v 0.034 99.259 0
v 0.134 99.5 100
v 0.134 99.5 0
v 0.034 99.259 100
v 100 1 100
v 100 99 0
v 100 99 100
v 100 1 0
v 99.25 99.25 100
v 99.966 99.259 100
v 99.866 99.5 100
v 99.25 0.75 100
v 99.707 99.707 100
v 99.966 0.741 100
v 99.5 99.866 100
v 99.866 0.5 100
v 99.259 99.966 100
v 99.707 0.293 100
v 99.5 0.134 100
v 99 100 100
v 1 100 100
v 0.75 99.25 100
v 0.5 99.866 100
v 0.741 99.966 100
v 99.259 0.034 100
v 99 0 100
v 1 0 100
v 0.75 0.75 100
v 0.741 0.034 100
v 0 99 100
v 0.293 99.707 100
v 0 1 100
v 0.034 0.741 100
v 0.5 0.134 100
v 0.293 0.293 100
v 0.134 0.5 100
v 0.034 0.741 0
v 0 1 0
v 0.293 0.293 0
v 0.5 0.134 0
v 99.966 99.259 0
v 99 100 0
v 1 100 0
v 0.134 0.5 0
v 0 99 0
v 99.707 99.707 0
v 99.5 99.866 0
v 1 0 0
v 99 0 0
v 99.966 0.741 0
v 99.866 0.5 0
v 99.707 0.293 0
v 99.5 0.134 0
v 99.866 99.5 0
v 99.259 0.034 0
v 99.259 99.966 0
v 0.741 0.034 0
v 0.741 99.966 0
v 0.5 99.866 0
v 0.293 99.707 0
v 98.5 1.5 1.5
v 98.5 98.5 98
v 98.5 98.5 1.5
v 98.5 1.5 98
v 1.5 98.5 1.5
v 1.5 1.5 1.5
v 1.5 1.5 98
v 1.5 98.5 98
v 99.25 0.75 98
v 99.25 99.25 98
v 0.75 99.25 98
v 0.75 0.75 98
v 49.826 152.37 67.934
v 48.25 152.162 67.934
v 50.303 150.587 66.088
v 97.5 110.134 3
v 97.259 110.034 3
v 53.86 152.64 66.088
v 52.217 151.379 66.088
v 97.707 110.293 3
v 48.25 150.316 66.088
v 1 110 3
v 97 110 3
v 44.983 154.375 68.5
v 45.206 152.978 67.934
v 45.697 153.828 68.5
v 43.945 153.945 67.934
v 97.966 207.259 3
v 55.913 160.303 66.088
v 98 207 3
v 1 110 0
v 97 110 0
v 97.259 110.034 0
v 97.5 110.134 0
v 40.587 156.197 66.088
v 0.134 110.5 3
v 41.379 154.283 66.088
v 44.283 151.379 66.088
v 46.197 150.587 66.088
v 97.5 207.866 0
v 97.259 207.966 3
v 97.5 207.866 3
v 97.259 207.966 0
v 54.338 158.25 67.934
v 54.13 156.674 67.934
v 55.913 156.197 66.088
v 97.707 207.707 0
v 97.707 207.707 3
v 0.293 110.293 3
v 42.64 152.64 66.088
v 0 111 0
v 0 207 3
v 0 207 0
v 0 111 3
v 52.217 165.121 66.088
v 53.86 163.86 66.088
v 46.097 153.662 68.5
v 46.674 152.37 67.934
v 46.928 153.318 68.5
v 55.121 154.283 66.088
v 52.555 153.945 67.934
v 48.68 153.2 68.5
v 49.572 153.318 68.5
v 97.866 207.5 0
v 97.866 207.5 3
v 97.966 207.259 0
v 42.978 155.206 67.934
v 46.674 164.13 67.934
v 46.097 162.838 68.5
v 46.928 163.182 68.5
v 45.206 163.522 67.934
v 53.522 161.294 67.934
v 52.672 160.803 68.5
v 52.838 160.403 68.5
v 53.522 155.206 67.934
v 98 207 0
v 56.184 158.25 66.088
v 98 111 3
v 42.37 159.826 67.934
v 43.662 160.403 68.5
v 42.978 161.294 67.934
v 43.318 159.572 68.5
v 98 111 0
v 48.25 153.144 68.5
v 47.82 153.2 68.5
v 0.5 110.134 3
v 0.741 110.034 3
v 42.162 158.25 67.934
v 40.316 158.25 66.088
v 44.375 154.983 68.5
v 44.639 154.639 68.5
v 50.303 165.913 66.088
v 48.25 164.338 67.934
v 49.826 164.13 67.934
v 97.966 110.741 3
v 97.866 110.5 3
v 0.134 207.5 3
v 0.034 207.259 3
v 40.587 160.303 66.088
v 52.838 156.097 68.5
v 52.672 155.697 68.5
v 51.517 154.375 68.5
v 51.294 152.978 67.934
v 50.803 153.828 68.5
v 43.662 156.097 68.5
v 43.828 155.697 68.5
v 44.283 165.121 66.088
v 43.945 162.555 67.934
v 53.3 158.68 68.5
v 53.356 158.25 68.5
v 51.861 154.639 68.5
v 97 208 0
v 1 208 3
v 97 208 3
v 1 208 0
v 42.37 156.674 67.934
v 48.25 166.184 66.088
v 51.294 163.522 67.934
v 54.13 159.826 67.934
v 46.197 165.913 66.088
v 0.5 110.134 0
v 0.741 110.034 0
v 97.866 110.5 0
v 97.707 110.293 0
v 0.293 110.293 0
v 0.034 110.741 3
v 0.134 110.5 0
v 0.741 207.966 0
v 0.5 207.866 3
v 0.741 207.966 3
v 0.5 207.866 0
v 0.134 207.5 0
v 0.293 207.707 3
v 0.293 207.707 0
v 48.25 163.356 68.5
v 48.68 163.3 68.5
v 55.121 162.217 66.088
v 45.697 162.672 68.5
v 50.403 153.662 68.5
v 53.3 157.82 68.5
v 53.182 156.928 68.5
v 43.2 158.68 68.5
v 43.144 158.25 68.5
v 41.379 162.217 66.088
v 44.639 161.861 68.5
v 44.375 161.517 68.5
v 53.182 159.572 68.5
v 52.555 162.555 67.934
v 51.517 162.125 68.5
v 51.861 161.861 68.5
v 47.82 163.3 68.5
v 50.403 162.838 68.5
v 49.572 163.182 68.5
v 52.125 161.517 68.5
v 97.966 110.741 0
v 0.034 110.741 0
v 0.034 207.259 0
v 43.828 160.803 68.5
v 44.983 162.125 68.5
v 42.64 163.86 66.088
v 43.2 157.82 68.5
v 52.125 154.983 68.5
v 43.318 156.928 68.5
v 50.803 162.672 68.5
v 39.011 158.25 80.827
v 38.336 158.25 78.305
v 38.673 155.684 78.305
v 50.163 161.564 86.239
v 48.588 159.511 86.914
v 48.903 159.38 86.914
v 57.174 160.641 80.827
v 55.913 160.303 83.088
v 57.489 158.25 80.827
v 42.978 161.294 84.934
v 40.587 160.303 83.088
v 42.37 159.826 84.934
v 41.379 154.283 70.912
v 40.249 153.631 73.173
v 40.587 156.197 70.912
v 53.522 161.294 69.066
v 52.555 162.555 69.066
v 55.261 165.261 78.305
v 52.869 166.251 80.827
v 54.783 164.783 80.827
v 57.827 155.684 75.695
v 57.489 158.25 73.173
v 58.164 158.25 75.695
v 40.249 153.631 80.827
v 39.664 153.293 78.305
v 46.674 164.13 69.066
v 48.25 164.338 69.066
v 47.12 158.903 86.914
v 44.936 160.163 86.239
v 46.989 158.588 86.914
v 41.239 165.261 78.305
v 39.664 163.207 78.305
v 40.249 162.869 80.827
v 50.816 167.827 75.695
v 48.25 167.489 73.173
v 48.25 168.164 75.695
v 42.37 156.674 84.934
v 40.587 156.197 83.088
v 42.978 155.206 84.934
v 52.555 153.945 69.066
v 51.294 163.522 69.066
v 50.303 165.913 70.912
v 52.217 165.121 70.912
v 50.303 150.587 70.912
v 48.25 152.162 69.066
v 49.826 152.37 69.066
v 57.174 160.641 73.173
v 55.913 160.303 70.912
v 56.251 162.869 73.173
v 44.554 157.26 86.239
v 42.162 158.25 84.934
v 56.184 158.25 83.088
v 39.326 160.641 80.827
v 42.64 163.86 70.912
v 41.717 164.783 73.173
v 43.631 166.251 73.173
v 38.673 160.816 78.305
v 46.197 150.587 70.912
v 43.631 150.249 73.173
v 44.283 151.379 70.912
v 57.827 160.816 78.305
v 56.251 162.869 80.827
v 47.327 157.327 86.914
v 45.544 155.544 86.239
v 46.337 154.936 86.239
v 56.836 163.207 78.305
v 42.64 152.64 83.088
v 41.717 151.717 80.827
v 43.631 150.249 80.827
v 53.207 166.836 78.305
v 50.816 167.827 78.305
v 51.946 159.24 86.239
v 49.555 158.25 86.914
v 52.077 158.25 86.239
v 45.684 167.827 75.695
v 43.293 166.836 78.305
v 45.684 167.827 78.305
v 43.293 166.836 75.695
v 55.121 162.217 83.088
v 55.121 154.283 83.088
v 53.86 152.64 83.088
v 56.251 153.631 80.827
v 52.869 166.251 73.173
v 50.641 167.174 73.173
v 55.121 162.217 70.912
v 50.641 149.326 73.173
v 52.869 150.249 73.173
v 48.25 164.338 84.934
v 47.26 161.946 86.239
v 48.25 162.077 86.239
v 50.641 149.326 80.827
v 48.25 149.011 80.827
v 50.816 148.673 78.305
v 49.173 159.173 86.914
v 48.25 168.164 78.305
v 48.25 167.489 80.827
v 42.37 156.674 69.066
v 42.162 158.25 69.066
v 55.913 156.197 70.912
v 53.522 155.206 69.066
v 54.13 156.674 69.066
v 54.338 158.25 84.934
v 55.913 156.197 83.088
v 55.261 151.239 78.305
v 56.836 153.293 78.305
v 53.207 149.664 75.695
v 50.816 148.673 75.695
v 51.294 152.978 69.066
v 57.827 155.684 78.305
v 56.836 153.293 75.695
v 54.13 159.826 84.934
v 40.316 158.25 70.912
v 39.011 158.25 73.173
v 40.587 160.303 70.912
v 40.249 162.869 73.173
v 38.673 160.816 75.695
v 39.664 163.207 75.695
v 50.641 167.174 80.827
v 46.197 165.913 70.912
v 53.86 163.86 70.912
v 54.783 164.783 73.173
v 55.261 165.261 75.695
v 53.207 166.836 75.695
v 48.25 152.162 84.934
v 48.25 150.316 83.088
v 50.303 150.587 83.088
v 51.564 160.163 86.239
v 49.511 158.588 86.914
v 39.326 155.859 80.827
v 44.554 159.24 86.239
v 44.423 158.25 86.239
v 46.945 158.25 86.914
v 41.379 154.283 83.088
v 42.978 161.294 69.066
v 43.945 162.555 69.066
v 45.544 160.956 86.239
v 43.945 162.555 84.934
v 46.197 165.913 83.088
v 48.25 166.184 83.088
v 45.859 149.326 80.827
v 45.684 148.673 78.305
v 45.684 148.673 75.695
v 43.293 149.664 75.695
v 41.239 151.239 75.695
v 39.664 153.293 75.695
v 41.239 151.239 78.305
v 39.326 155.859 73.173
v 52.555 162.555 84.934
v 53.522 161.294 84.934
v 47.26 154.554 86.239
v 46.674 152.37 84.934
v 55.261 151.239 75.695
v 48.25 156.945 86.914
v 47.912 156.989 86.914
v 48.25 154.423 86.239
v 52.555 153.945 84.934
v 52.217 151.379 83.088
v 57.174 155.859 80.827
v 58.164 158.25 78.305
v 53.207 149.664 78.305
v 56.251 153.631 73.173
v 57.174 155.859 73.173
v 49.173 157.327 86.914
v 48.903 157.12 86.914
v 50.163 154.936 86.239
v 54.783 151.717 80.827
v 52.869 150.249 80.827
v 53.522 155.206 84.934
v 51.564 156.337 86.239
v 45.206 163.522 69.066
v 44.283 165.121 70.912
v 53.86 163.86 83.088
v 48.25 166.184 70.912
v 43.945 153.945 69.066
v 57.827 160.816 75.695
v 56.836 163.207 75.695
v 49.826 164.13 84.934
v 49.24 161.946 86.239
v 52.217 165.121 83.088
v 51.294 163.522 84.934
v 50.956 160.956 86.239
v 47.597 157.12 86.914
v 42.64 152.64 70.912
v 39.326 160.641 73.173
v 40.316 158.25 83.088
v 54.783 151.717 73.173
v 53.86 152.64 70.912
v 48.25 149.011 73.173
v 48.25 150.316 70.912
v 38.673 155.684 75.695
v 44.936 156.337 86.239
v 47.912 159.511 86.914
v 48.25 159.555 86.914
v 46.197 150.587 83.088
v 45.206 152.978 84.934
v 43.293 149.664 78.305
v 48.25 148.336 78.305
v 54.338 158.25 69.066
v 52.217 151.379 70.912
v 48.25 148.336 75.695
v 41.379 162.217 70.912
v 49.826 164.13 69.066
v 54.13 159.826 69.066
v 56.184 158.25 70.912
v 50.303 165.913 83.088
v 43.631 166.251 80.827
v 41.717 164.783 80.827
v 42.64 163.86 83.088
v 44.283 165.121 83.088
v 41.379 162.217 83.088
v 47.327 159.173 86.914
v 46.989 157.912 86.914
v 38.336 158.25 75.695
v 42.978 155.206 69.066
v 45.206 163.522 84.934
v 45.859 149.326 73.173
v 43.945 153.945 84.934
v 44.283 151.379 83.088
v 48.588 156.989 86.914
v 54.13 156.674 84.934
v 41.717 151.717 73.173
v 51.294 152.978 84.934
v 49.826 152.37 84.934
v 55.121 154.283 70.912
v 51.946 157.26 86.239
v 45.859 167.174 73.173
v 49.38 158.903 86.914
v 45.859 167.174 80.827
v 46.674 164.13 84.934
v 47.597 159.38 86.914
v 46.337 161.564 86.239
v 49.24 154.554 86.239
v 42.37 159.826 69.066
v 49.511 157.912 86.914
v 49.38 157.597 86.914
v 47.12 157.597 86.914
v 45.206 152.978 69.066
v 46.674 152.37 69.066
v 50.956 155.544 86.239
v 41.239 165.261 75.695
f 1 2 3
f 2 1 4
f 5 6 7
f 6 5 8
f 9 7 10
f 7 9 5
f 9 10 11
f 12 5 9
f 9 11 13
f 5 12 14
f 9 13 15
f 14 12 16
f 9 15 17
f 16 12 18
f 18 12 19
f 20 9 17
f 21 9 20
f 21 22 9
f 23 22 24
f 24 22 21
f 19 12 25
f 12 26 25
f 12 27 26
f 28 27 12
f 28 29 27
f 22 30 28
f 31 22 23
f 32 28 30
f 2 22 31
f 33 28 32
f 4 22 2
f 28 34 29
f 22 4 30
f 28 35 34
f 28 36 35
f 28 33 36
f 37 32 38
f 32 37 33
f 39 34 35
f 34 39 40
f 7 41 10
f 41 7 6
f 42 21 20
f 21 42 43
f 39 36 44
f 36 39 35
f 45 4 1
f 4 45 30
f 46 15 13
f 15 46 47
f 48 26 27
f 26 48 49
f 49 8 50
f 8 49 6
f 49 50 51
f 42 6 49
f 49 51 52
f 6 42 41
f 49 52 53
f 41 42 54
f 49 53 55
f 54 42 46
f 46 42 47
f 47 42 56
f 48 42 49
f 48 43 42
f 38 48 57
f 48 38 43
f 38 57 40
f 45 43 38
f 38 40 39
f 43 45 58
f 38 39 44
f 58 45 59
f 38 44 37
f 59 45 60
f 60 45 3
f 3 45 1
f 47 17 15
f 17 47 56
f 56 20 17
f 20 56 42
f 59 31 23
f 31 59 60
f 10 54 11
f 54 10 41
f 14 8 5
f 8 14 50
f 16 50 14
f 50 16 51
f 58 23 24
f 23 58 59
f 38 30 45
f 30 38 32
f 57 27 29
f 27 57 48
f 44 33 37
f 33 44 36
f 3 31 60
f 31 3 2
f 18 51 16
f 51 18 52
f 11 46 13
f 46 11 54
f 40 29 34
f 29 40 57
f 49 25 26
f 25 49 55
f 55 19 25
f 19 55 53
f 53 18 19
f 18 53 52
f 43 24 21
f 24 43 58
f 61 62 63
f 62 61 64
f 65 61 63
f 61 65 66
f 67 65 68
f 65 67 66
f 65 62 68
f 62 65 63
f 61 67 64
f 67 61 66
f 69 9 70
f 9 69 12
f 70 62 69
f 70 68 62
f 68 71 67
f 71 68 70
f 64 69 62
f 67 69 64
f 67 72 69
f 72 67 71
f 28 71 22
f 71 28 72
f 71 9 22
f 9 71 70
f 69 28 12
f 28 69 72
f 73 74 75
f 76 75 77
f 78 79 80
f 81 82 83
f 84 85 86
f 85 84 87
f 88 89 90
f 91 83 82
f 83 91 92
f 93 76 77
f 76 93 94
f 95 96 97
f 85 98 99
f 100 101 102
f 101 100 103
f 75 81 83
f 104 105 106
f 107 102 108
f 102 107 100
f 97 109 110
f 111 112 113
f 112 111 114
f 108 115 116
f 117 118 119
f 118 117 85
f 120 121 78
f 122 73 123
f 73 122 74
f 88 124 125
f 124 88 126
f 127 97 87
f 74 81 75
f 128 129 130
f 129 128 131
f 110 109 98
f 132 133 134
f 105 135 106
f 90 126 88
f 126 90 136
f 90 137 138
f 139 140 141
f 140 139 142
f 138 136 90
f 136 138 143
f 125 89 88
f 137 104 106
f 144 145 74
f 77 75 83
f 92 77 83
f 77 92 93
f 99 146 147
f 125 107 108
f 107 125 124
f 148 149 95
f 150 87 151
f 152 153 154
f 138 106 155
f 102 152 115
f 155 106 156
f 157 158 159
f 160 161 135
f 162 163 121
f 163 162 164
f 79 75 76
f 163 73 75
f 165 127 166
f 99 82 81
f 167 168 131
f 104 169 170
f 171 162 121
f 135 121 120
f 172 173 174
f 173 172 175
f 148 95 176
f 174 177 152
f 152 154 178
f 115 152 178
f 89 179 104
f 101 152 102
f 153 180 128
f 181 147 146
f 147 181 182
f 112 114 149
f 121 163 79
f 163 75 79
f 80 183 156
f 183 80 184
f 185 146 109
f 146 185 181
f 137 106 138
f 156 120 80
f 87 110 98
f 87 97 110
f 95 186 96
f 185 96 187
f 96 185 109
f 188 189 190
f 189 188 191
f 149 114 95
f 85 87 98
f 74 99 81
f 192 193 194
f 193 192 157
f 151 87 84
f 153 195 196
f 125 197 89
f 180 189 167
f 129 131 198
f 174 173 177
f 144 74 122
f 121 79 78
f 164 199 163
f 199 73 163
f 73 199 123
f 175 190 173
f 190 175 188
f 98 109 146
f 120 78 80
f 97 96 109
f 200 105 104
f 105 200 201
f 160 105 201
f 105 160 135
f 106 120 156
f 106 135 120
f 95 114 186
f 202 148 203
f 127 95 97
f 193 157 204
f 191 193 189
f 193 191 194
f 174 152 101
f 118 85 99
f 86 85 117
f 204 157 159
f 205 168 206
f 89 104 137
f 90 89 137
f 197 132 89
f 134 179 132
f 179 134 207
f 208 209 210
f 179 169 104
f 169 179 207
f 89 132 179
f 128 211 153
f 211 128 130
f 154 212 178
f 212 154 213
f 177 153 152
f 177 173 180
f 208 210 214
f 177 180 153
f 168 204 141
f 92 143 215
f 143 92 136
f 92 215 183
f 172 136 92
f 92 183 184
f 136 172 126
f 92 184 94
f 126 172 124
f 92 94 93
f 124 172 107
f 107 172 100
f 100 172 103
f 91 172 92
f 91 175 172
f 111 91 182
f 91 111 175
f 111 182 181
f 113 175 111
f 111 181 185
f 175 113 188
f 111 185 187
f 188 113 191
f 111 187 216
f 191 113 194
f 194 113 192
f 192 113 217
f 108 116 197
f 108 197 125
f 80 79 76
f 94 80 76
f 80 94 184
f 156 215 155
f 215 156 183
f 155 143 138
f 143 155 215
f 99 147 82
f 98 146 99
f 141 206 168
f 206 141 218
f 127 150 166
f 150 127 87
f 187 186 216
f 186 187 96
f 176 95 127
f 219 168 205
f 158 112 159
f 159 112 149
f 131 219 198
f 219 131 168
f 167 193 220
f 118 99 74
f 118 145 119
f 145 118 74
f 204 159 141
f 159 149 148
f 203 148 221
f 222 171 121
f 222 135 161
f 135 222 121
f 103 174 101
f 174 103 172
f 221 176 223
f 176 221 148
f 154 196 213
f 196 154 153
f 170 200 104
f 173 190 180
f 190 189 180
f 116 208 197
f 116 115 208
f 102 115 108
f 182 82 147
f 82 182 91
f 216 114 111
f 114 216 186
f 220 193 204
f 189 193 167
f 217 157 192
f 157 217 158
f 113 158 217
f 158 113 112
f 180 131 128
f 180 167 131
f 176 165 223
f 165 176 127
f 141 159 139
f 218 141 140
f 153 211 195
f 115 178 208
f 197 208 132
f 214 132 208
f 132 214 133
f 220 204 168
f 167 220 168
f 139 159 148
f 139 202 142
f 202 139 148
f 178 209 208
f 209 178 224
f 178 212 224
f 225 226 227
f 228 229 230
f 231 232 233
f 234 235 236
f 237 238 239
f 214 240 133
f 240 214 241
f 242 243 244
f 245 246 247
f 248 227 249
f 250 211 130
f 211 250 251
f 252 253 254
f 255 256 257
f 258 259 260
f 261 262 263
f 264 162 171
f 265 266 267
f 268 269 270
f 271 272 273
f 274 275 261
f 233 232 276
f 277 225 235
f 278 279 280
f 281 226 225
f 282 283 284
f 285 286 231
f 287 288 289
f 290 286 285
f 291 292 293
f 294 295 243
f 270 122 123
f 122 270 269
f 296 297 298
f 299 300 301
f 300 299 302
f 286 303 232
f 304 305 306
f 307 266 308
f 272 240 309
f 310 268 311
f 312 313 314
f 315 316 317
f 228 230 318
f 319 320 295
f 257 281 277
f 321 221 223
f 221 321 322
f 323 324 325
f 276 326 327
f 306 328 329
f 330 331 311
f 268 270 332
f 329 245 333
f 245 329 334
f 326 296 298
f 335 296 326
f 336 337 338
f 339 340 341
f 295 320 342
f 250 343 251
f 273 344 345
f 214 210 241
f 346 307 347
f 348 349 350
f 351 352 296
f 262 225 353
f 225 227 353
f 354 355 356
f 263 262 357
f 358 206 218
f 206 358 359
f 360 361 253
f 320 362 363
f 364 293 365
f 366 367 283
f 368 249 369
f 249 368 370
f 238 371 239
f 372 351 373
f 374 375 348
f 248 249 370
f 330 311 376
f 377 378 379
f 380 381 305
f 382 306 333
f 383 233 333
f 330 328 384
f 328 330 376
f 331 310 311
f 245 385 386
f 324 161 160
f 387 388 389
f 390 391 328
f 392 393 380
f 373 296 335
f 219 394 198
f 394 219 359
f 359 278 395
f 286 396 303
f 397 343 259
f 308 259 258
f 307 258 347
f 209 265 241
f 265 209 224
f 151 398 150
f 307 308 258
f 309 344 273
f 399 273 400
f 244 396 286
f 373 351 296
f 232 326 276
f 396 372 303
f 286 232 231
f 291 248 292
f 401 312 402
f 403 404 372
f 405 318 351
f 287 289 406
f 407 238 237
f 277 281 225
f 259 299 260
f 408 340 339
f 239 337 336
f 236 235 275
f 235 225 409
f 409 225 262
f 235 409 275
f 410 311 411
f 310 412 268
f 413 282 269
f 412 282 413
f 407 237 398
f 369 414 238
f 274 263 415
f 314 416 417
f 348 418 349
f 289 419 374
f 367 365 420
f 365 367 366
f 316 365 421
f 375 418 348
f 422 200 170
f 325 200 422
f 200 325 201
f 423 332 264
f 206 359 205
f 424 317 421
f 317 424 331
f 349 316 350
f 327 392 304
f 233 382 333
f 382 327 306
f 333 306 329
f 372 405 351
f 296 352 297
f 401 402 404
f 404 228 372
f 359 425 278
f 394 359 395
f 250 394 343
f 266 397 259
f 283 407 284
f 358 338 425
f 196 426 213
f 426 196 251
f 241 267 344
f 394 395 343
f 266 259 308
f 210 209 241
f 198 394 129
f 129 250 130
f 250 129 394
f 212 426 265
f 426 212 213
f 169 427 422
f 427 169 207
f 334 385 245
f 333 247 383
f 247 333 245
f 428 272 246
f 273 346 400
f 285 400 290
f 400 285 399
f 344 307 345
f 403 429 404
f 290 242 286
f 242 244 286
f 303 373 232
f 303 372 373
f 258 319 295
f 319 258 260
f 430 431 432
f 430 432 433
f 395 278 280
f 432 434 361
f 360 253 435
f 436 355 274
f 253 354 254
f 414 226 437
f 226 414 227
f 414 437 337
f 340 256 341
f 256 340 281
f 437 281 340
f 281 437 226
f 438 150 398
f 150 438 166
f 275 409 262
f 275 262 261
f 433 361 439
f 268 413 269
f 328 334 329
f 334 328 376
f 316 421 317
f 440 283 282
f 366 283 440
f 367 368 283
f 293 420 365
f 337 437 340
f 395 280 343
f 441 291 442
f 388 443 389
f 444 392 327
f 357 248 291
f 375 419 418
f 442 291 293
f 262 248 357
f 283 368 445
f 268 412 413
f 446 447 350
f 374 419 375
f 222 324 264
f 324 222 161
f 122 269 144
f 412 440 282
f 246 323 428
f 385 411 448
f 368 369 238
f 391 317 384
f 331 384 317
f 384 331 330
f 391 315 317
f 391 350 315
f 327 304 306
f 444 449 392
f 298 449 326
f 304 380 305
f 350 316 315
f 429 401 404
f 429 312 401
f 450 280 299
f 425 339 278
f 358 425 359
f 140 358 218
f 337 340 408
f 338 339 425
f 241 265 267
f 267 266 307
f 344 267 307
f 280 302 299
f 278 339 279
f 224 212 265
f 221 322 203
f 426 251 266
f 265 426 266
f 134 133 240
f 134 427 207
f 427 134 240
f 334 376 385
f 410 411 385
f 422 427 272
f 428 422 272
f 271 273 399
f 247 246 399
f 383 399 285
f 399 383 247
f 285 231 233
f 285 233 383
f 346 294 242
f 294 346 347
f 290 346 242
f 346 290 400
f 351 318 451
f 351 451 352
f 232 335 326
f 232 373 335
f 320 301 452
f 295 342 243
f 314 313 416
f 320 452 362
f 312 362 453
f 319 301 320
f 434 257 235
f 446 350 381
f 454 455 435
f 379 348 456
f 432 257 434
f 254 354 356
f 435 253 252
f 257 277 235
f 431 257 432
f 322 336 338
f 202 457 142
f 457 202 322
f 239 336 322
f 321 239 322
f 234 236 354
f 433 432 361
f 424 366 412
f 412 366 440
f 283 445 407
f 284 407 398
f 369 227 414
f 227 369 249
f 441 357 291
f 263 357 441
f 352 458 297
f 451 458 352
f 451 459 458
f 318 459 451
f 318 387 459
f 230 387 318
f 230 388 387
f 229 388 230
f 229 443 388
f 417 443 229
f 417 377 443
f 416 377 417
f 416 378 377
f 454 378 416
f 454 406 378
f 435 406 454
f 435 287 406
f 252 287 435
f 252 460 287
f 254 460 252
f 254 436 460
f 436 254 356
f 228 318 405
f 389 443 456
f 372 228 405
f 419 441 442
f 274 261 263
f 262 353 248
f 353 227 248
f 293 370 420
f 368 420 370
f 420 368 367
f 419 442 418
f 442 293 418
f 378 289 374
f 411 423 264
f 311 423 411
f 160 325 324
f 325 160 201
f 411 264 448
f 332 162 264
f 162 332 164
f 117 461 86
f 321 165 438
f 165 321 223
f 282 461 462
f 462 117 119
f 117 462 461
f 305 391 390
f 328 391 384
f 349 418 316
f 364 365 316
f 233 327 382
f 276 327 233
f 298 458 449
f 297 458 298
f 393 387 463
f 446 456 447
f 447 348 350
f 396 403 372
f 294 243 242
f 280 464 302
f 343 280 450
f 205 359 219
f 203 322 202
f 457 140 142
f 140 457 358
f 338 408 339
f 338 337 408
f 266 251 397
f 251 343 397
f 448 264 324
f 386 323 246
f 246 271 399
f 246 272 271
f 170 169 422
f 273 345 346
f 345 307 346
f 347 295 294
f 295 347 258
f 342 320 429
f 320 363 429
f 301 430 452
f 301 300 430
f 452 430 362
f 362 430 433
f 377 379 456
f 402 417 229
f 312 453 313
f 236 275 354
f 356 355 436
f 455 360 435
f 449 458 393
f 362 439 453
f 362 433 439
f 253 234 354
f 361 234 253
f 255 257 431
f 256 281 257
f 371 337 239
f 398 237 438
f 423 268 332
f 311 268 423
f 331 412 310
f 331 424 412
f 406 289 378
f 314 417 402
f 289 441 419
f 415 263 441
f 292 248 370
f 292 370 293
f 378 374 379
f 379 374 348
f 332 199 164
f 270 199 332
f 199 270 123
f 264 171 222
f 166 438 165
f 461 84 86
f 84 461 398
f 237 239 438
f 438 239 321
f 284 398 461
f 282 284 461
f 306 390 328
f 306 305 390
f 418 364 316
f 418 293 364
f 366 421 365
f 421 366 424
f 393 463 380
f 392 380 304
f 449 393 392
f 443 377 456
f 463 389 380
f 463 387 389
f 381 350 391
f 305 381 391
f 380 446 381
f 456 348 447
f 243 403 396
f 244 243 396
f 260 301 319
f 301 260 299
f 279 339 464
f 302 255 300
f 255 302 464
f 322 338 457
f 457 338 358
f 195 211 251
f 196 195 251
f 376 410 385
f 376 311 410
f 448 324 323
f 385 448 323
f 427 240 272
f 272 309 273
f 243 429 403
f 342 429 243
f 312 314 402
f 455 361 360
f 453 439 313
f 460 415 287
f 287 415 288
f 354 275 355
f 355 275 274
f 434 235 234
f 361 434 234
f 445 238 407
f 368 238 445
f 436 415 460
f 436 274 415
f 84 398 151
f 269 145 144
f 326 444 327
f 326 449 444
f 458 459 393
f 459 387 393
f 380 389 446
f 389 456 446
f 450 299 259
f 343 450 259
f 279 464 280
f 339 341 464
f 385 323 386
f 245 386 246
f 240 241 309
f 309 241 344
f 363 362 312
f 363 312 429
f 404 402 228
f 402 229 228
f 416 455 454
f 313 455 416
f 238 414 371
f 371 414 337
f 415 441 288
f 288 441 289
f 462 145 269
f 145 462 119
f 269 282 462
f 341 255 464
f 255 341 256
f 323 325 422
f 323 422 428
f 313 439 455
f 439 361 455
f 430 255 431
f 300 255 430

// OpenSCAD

figure = "sphere";      //[sphere,cube,pyramide,triangles,pyramide2,diamond,pyramide3]
//Secret compartment
Secret = "false";   //[true,false]
//Cover
Cover = "true";     //[true,false]
//Box length
long_boit = 100;
//Box width
larg_boit = 100;
//Box height
haut_boit = 100;




module toto() {
}

$fn = 24;


haut_bo_s = haut_boit/2;
ray_sph = long_boit/10;
ray1_cyl = larg_boit/5.5;
ray2_cyl = 0;
haut_cyl = haut_boit/3;
cote_cub = long_boit/6;
ray_cyl_t = ray_sph;
haut_cyl_t = ray_cyl_t;
haut_t = ray_sph*2;
cot_tr = cote_cub*1.5;


teta = 2;
ep_bort = 1.5;
ep_bort_s = 2.25;
ep_fond = 1.5;
sec_haut = 5;
sec = 2;
haut_couv_av_hul = 2;   //hauteur du couvercle avant que l'on fasse le hull
haut_bord = haut_couv_av_hul;
long_boit_int = long_boit - ep_bort*teta;
larg_boit_int = larg_boit - ep_bort*teta;
haut_boit_int = haut_boit - ep_fond;
haut_couv = haut_boit/teta;
ray_cyl_mink = 1;
haut_cyl_mink = 1;
tolerance=0.5;


boite();
if(Secret == "false") {
    translate([0,larg_boit+10,0])
    if(Cover == "true") {
        couvercle();
    }
}
if(Secret == "true") {
    if(Cover == "true") {
        translate([0,larg_boit*2+10*2,0])
        couvercle();
    }
}




module boite() {
    if(Secret == "true") {
        translate([0,larg_boit+10,0]){
            union() {
                difference() {
                translate ([ray_cyl_mink, ray_cyl_mink, 0])
                    minkowski() {
                        cube([long_boit-2*ray_cyl_mink, larg_boit-2*ray_cyl_mink, haut_boit-haut_cyl_mink]);
                        cylinder(r = ray_cyl_mink, h = haut_cyl_mink);
                    }
                    translate([ep_bort_s/3*2, ep_bort_s/3*2, ep_fond])
                        cube([long_boit-ep_bort_s/3*2*2, larg_boit-ep_bort_s/3*2*2, haut_boit_int + sec_haut]);
        //            translate([ep_bort/teta,ep_bort/teta,haut_boit-haut_bord])
        	//			cube([long_boit-ep_bort, larg_boit-ep_bort, haut_bord + sec]);
                    translate([ep_bort_s/3,ep_bort_s/3,haut_bo_s-haut_couv_av_hul])
                    cube([long_boit-ep_bort_s/3*2,larg_boit-ep_bort_s/3*2,haut_boit]);
                }
            }
        }
                        difference() {
                    cube([long_boit_int+ep_bort_s/3,larg_boit_int+ep_bort_s/3,haut_boit_int-haut_bo_s]);
                    translate([ep_bort_s/2,ep_bort_s/2,ep_fond])
                    cube([long_boit_int-ep_bort_s/3*2,larg_boit_int-ep_bort_s/3*2,haut_boit_int]);
            }
        }
                    
                    
    if(Secret == "false") {        
        union() {
            difference() {
                translate ([ray_cyl_mink, ray_cyl_mink, 0])
                    minkowski() {
                        cube([long_boit-2*ray_cyl_mink, larg_boit-2*ray_cyl_mink, haut_boit-haut_cyl_mink]);
                        cylinder(r = ray_cyl_mink, h = haut_cyl_mink);
                    }
                    translate([ep_bort, ep_bort, ep_fond])
                        cube([long_boit_int, larg_boit_int, haut_boit_int + sec_haut]);
                    translate([ep_bort/teta,ep_bort/teta,haut_boit-haut_bord])
                        cube([long_boit-ep_bort, larg_boit-ep_bort, haut_bord + sec]);
                    
    
    
        
            }
        }
        
    }    

    }

module couvercle() {
    union () {
        hull() {
			translate ([ray_cyl_mink, ray_cyl_mink, 0])
				minkowski() {
					cube([long_boit - ep_bort - ray_cyl_mink*2 - tolerance, larg_boit - ep_bort - ray_cyl_mink*2 - tolerance, haut_couv_av_hul]);
					cylinder(r = ray_cyl_mink, h = haut_cyl_mink);
				}
            if(figure == "sphere")
                translate([long_boit/teta - ep_bort - tolerance/2,  larg_boit/teta - ep_bort - tolerance/2, haut_couv+ray_sph])
					sphere(r=ray_sph);
            if(figure == "cube")
                translate([long_boit/teta -cote_cub/teta - tolerance/2, larg_boit/teta -cote_cub/teta - tolerance/2, haut_couv])
					cube(cote_cub);
            if(figure == "pyramide")
                translate([long_boit/teta - ep_bort - tolerance/2,  larg_boit/teta - ep_bort - tolerance/2, haut_couv+ray_sph])
					sphere(r=ray_sph);
            if(figure == "triangles")
                translate([long_boit/teta - ep_bort - tolerance/2,  larg_boit/teta - ep_bort - tolerance/2, haut_couv+ray_sph])
					sphere(r=ray_sph);
            if(figure == "pyramide2")
                translate([long_boit/teta - ep_bort - tolerance/2,  larg_boit/teta - ep_bort - tolerance/2, haut_couv+ray_sph])
					sphere(r=ray_sph);
            if(figure == "diamond")
                translate([long_boit/teta - ep_bort - tolerance/2,  larg_boit/teta - ep_bort - tolerance/2, haut_couv+ray_sph])
					sphere(r=ray_sph);
            if(figure == "sphere2")
                translate([long_boit/teta - ep_bort - tolerance/2,  larg_boit/teta - ep_bort - tolerance/2, haut_couv+ray_sph])
					sphere(r=ray_sph);
            if(figure == "pyramide3")
                translate([long_boit/teta - ep_bort - tolerance/2,  larg_boit/teta - ep_bort - tolerance/2, haut_couv+ray_sph])
					sphere(r=ray_sph);
        
        
        }
            if(figure == "sphere")
                translate([long_boit/teta - ep_bort - tolerance/2,  larg_boit/teta - ep_bort - tolerance/2,  haut_couv+ray_sph*teta+ray_sph*0.7])
                sphere(r=ray_sph);
            if(figure == "cube")
                translate([long_boit/teta - tolerance/2, larg_boit/teta - tolerance/2, haut_couv+cote_cub*1.5])
                cube(cote_cub,center=true);
            if(figure == "pyramide")
                translate([long_boit/teta - ep_bort - tolerance/2,  larg_boit/teta - ep_bort - tolerance/2 ,haut_couv+haut_cyl+haut_cyl/1.2])
                rotate([180,0,0])
                cylinder(r1 = ray1_cyl, r2 = ray2_cyl, h = haut_cyl);
            if(figure == "triangles")
                translate([long_boit/2-haut_cyl_t*3.15,larg_boit/2-haut_cyl_t/1.2,0])
                union() {
                    translate([haut_t-ray_sph/6,0,haut_t+ray_cyl_t+haut_couv+ray_sph])    
                    couv_t();
    }
            if(figure == "pyramide2")
                translate([long_boit_int/2-cote_cub/2,larg_boit_int/2-cote_cub/2,haut_couv+ray_sph*2])
                rotate([0,180,0])
                translate([-cote_cub+ray_sph/16,-ray_sph/16,-haut_cyl+1])
                hull() {
                    cube([cote_cub,cote_cub,1]);
                    translate([cote_cub/2-0.5,cote_cub/2-0.5,haut_cyl])
                    cube([1,1,1]);
                }
            if(figure == "diamond")
                translate([long_boit_int/2-cote_cub/2,larg_boit_int/2-cote_cub/2,haut_couv+ray_sph*2])
                rotate([0,180,0])
                translate([-cote_cub+ray_sph/16,-ray_sph/16,-haut_cyl+1])
                hull() {
                    cube([cote_cub,cote_cub,1]);
                    translate([cote_cub/2-0.5,cote_cub/2-0.5,haut_cyl])
                    cube([1,1,1]);
                    translate([cote_cub/2-0.5,cote_cub/2-0.5,-haut_cyl])
                    cube([1,1,1]);
                }
            if(figure == "pyramide3")
                translate([-cot_tr/2,-(sqrt(cot_tr*cot_tr-(cot_tr/2*cot_tr/2)))/3,0])
                translate([long_boit/2-ray_cyl_mink*2,larg_boit/2-ray_cyl_mink*2,haut_couv+ray_sph*2+cot_tr/1.5])
            mirror([0,0,1]){ 
                    tri_equ();
            }
            
}

}



module couv_t() {
    rotate([-90,0,0])
        hull () {
            translate([0,0,0]) 
                cylinder(r=ray_cyl_t,h=haut_cyl_t);
            translate([haut_t,0,0]) 
                cylinder(r=ray_cyl_t,h=haut_cyl_t);
            translate([haut_t/2,haut_t,0]) 
                cylinder(r=ray_cyl_t,h=haut_cyl_t);
    }
        translate([haut_cyl_t+ray_cyl_t/2,-ray_cyl_t/2,0])
        rotate([-90,0,90])
        hull () {
            translate([0,0,0]) 
                cylinder(r=ray_cyl_t,h=haut_cyl_t);
            translate([haut_t,0,0]) 
                cylinder(r=ray_cyl_t,h=haut_cyl_t);
            translate([haut_t/2,haut_t,0]) 
                cylinder(r=ray_cyl_t,h=haut_cyl_t);  
}
    }
      

module tri_equ() {
    polyhedron(points = [[0,0,0],[cot_tr,0,0],[cot_tr/2,sqrt(cot_tr*cot_tr-(cot_tr/2*cot_tr/2)),0],[cot_tr/2,(sqrt(cot_tr*cot_tr-(cot_tr/2*cot_tr/2)))/3,sqrt(cot_tr*cot_tr-(cot_tr/2*cot_tr/2))]],faces=[ [0,1,4],[1,2,4],[2,3,4],[3,0,4],[1,0,3],[2,1,3],[0,1,2],[0,2,3]]);
    
}
    




























